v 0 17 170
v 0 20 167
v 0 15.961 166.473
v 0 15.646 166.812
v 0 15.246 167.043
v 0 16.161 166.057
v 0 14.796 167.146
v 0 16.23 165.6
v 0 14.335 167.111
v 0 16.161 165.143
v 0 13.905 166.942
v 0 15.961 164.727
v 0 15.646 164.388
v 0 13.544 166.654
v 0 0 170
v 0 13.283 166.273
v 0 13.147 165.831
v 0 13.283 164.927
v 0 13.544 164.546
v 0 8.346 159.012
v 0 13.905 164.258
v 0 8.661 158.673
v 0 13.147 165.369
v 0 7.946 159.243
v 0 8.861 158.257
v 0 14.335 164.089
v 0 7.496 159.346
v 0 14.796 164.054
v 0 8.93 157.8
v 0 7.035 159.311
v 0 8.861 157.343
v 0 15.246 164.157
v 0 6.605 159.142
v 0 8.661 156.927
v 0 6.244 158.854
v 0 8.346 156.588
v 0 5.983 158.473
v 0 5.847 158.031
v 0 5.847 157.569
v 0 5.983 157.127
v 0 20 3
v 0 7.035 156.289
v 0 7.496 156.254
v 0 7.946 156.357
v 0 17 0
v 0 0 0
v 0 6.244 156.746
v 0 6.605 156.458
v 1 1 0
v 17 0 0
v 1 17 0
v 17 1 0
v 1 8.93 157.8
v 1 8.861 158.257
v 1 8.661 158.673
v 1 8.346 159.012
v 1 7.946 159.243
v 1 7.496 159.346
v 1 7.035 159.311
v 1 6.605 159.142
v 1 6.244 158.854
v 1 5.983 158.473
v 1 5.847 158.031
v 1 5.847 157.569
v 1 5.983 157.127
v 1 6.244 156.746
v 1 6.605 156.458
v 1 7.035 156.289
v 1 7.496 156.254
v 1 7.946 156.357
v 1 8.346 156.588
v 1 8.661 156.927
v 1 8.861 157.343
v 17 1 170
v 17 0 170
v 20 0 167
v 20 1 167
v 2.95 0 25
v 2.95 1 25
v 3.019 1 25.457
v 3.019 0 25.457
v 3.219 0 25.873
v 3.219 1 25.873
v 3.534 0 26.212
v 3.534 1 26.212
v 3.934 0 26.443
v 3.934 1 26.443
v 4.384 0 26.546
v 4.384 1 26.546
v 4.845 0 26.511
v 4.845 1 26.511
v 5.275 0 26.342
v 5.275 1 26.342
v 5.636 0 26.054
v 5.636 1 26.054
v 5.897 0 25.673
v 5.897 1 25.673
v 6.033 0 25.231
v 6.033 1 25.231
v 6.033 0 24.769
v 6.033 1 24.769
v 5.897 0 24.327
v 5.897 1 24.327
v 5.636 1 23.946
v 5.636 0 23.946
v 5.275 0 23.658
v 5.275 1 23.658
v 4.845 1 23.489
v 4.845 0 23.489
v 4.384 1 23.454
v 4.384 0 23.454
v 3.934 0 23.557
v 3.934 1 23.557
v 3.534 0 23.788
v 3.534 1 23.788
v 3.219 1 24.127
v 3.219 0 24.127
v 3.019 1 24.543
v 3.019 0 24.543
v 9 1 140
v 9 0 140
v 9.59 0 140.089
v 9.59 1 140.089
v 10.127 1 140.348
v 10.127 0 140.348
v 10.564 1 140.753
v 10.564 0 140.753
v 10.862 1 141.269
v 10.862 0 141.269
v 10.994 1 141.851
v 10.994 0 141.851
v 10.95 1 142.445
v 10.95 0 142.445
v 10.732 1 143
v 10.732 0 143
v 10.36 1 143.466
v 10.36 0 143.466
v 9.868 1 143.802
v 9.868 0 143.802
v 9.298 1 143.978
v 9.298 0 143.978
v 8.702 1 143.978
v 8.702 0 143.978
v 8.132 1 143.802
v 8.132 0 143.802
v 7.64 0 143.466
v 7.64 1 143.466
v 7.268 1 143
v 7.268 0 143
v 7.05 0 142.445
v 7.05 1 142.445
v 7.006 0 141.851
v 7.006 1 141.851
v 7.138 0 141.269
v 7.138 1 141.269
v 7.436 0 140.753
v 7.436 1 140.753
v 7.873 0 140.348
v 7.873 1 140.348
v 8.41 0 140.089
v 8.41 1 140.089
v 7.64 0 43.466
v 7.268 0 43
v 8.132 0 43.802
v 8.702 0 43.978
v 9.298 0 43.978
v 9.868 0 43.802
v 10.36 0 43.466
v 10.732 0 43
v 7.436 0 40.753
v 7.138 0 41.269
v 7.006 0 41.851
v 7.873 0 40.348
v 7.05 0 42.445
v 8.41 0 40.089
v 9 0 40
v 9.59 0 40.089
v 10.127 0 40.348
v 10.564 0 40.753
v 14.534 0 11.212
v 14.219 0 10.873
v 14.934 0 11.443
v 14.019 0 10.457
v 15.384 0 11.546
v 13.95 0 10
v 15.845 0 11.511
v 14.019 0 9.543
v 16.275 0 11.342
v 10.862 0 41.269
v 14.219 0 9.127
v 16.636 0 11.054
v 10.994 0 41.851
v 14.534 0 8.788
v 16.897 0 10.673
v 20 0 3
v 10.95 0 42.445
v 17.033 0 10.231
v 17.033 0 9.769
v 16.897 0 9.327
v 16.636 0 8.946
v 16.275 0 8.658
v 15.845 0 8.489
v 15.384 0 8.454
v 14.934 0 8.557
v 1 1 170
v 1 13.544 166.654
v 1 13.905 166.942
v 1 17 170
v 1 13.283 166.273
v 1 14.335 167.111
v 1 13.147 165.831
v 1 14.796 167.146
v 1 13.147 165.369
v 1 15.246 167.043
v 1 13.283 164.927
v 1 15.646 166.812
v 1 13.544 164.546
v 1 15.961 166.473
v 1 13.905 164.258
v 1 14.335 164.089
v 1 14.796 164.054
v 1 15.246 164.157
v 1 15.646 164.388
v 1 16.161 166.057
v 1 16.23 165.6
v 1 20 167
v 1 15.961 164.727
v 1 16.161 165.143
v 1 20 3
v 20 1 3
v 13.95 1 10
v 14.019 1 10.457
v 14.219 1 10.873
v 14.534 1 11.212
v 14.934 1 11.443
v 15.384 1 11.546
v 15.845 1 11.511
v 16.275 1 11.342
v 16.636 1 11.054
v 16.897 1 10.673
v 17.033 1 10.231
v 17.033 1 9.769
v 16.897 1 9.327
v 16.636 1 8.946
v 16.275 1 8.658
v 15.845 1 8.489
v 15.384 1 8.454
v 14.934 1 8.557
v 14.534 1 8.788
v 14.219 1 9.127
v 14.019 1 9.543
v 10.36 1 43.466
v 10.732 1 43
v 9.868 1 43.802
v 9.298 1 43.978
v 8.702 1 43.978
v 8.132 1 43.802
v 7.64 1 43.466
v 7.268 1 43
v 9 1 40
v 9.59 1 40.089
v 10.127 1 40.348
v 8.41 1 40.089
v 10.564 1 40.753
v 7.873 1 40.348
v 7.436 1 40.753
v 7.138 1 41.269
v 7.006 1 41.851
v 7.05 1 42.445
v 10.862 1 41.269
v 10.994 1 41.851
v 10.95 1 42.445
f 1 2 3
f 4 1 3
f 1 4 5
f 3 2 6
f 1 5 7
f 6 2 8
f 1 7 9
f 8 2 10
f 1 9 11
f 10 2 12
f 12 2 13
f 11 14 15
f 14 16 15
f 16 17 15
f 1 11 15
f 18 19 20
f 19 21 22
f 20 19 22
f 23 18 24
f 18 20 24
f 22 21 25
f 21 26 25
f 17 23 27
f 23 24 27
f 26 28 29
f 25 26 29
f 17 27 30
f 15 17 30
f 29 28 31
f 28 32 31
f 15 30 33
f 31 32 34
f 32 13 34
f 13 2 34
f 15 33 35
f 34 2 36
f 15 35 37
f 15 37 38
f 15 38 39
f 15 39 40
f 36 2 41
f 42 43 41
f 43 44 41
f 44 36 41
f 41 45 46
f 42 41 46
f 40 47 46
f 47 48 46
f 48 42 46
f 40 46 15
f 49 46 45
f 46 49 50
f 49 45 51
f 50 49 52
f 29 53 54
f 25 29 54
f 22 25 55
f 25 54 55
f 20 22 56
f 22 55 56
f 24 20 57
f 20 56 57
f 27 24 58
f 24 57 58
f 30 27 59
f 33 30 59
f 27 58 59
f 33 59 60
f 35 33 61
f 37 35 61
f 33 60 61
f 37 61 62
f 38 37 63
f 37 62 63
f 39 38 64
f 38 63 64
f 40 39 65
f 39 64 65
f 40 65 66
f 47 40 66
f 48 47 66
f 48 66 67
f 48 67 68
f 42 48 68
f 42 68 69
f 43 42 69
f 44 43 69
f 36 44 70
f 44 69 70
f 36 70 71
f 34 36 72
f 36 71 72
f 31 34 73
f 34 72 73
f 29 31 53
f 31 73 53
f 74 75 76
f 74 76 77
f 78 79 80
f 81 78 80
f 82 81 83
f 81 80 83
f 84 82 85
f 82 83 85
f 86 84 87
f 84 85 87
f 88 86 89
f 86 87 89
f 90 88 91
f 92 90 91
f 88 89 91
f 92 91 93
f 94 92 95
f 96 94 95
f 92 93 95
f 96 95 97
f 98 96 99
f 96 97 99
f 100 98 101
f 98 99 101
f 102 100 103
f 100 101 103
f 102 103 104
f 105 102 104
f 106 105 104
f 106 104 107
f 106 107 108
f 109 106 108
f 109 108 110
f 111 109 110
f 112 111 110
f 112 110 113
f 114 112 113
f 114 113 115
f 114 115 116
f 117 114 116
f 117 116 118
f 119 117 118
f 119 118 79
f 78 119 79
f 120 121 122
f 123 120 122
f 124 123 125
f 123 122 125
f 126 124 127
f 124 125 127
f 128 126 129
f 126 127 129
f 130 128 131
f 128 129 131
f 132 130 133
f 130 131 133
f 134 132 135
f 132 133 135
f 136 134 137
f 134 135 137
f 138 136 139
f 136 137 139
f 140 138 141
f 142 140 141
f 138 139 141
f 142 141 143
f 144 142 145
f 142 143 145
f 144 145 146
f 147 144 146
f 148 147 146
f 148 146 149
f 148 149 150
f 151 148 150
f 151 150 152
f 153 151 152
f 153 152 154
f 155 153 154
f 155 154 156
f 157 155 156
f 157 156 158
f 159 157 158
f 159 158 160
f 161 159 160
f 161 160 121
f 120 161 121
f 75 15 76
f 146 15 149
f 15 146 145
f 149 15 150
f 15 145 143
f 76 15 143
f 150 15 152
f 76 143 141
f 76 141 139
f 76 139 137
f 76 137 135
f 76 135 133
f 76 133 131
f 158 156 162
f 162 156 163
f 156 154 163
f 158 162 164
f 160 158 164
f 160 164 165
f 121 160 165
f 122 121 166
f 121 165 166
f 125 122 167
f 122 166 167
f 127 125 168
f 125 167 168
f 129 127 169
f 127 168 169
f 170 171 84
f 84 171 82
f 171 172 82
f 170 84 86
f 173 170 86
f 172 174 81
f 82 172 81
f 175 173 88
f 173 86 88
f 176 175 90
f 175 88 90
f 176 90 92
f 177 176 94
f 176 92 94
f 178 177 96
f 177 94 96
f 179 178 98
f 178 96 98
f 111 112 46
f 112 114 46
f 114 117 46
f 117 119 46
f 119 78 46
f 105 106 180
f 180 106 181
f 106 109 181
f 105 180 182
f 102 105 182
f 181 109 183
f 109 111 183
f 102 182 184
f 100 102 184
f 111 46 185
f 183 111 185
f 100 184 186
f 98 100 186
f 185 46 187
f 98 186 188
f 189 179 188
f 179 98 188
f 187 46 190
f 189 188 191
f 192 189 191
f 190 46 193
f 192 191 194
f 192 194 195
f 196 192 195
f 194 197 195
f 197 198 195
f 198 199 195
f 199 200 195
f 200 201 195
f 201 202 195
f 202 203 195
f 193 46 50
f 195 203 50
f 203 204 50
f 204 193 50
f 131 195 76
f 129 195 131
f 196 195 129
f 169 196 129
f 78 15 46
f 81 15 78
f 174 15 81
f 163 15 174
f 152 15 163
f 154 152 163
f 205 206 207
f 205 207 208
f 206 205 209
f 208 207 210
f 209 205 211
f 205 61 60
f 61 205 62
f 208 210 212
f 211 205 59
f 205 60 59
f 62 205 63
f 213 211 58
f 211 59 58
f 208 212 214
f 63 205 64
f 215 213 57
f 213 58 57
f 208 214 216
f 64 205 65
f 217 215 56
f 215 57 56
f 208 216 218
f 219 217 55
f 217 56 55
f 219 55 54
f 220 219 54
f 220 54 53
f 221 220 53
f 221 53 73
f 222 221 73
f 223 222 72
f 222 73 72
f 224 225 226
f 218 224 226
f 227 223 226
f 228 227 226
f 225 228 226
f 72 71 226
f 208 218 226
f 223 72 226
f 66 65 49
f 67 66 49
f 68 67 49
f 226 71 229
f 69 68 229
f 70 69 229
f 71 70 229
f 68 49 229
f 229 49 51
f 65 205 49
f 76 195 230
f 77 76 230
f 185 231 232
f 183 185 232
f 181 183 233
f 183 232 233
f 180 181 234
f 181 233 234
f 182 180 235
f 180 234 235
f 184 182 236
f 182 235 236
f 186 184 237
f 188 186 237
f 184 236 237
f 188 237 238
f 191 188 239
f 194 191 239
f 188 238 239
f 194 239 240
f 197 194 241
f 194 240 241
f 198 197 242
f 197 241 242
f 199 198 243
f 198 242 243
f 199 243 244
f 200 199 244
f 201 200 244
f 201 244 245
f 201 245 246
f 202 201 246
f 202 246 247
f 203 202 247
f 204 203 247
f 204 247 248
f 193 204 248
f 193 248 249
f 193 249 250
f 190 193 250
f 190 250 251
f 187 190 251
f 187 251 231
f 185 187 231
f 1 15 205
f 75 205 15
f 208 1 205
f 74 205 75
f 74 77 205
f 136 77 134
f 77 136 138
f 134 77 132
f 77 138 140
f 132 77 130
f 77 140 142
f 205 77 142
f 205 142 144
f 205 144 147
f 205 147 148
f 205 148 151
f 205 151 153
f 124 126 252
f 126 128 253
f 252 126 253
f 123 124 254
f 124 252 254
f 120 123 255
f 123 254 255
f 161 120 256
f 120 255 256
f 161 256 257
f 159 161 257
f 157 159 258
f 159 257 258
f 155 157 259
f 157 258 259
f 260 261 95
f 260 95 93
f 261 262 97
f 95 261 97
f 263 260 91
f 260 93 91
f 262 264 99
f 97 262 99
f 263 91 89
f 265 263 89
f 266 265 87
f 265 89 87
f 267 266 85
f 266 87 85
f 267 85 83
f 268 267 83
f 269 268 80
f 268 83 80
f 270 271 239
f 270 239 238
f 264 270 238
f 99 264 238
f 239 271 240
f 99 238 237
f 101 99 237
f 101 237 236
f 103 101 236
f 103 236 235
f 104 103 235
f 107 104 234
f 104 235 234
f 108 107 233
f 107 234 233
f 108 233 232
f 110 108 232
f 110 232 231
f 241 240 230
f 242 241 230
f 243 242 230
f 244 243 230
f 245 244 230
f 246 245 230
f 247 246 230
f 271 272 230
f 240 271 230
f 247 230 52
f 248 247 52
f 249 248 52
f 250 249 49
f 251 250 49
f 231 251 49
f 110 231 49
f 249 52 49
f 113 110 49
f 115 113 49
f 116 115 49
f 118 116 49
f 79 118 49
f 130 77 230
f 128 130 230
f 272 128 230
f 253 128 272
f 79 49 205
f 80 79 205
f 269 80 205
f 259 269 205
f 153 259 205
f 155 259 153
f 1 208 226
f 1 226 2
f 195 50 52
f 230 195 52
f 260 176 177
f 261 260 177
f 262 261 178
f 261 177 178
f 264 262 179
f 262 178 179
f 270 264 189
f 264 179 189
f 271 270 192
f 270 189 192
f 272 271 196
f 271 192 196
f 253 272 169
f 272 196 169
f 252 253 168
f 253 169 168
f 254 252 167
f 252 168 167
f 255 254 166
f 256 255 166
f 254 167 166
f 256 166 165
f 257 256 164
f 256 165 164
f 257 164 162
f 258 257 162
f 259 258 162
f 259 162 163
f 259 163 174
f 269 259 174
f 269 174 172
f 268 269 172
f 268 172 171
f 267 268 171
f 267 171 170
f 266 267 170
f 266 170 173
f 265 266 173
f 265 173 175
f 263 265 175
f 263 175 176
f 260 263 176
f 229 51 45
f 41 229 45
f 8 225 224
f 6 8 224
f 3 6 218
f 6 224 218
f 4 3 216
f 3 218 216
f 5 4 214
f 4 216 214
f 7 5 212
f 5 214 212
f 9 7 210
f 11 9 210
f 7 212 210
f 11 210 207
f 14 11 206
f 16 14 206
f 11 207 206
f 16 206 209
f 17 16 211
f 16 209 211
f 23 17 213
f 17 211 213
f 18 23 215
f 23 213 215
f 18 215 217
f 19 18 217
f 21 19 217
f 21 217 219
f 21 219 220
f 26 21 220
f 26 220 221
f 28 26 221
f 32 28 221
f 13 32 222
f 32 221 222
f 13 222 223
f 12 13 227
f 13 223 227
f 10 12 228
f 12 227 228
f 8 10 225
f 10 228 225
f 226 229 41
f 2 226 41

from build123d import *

# Parameters (mm, degrees)
BASE_DEPTH           = 170
CHAMFER1_SIZE        = 3
SKETCH4_R            = 1.55
CARRIAGESIDE_DEPTH   = 173.002906952
SKETCH6_R            = 1.55
CABLECHAINSIDE_DEPTH = 1
SKETCH7_R            = 2
CUT_EXTRUDE1_DEPTH   = 173.336879396


with BuildPart() as part:
    # Sketch1 → Base (new body)
    with BuildSketch(Plane.XY):
        Polygon((0, 0), (20, 0), (20, 1), (1, 1), (1, 20), (0, 20), align=None)
    extrude(amount=BASE_DEPTH)

    # Chamfer1
    chamfer1_edges = [part.edges().sort_by_distance(p)[0] for p in [
        (20, 0.5, 170),
        (0.5, 20, 170),
        (0.5, 20, 0),
        (20, 0.5, 0),
    ]]
    chamfer(chamfer1_edges, length=CHAMFER1_SIZE)

    # Sketch4 → CarriageSide (cut, through all)
    with BuildSketch(Plane(origin=(2, 1, 0), x_dir=(0, 0, -1), z_dir=(0, 1, 0))):
        with Locations(Location((-10, -13.5, 0), (0, 0, 90))):
            Circle(SKETCH4_R)
        with Locations(Location((-25, -2.5, 0), (0, 0, 90))):
            Circle(SKETCH4_R)
    extrude(amount=-CARRIAGESIDE_DEPTH, mode=Mode.SUBTRACT)

    # Sketch6 → CableChainSide (cut)
    with BuildSketch(Plane(origin=(1, 0, 0), x_dir=(0, 0, -1), z_dir=(1, 0, 0))):
        with Locations(Location((-165.6, 14.68, 0), (0, 0, 90))):
            Circle(SKETCH6_R)
        with Locations(Location((-157.8, 7.38, 0), (0, 0, 90))):
            Circle(SKETCH6_R)
    extrude(amount=-CABLECHAINSIDE_DEPTH, mode=Mode.SUBTRACT)

    # Sketch7 → Cut-Extrude1 (cut, through all)
    with BuildSketch(Plane.XZ):
        with Locations(Location((9, 142, 0), (0, 0, 270))):
            Circle(SKETCH7_R)
        with Locations(Location((9, 42, 0), (0, 0, 270))):
            Circle(SKETCH7_R)
    extrude(amount=-CUT_EXTRUDE1_DEPTH, mode=Mode.SUBTRACT)


solid = part.part
